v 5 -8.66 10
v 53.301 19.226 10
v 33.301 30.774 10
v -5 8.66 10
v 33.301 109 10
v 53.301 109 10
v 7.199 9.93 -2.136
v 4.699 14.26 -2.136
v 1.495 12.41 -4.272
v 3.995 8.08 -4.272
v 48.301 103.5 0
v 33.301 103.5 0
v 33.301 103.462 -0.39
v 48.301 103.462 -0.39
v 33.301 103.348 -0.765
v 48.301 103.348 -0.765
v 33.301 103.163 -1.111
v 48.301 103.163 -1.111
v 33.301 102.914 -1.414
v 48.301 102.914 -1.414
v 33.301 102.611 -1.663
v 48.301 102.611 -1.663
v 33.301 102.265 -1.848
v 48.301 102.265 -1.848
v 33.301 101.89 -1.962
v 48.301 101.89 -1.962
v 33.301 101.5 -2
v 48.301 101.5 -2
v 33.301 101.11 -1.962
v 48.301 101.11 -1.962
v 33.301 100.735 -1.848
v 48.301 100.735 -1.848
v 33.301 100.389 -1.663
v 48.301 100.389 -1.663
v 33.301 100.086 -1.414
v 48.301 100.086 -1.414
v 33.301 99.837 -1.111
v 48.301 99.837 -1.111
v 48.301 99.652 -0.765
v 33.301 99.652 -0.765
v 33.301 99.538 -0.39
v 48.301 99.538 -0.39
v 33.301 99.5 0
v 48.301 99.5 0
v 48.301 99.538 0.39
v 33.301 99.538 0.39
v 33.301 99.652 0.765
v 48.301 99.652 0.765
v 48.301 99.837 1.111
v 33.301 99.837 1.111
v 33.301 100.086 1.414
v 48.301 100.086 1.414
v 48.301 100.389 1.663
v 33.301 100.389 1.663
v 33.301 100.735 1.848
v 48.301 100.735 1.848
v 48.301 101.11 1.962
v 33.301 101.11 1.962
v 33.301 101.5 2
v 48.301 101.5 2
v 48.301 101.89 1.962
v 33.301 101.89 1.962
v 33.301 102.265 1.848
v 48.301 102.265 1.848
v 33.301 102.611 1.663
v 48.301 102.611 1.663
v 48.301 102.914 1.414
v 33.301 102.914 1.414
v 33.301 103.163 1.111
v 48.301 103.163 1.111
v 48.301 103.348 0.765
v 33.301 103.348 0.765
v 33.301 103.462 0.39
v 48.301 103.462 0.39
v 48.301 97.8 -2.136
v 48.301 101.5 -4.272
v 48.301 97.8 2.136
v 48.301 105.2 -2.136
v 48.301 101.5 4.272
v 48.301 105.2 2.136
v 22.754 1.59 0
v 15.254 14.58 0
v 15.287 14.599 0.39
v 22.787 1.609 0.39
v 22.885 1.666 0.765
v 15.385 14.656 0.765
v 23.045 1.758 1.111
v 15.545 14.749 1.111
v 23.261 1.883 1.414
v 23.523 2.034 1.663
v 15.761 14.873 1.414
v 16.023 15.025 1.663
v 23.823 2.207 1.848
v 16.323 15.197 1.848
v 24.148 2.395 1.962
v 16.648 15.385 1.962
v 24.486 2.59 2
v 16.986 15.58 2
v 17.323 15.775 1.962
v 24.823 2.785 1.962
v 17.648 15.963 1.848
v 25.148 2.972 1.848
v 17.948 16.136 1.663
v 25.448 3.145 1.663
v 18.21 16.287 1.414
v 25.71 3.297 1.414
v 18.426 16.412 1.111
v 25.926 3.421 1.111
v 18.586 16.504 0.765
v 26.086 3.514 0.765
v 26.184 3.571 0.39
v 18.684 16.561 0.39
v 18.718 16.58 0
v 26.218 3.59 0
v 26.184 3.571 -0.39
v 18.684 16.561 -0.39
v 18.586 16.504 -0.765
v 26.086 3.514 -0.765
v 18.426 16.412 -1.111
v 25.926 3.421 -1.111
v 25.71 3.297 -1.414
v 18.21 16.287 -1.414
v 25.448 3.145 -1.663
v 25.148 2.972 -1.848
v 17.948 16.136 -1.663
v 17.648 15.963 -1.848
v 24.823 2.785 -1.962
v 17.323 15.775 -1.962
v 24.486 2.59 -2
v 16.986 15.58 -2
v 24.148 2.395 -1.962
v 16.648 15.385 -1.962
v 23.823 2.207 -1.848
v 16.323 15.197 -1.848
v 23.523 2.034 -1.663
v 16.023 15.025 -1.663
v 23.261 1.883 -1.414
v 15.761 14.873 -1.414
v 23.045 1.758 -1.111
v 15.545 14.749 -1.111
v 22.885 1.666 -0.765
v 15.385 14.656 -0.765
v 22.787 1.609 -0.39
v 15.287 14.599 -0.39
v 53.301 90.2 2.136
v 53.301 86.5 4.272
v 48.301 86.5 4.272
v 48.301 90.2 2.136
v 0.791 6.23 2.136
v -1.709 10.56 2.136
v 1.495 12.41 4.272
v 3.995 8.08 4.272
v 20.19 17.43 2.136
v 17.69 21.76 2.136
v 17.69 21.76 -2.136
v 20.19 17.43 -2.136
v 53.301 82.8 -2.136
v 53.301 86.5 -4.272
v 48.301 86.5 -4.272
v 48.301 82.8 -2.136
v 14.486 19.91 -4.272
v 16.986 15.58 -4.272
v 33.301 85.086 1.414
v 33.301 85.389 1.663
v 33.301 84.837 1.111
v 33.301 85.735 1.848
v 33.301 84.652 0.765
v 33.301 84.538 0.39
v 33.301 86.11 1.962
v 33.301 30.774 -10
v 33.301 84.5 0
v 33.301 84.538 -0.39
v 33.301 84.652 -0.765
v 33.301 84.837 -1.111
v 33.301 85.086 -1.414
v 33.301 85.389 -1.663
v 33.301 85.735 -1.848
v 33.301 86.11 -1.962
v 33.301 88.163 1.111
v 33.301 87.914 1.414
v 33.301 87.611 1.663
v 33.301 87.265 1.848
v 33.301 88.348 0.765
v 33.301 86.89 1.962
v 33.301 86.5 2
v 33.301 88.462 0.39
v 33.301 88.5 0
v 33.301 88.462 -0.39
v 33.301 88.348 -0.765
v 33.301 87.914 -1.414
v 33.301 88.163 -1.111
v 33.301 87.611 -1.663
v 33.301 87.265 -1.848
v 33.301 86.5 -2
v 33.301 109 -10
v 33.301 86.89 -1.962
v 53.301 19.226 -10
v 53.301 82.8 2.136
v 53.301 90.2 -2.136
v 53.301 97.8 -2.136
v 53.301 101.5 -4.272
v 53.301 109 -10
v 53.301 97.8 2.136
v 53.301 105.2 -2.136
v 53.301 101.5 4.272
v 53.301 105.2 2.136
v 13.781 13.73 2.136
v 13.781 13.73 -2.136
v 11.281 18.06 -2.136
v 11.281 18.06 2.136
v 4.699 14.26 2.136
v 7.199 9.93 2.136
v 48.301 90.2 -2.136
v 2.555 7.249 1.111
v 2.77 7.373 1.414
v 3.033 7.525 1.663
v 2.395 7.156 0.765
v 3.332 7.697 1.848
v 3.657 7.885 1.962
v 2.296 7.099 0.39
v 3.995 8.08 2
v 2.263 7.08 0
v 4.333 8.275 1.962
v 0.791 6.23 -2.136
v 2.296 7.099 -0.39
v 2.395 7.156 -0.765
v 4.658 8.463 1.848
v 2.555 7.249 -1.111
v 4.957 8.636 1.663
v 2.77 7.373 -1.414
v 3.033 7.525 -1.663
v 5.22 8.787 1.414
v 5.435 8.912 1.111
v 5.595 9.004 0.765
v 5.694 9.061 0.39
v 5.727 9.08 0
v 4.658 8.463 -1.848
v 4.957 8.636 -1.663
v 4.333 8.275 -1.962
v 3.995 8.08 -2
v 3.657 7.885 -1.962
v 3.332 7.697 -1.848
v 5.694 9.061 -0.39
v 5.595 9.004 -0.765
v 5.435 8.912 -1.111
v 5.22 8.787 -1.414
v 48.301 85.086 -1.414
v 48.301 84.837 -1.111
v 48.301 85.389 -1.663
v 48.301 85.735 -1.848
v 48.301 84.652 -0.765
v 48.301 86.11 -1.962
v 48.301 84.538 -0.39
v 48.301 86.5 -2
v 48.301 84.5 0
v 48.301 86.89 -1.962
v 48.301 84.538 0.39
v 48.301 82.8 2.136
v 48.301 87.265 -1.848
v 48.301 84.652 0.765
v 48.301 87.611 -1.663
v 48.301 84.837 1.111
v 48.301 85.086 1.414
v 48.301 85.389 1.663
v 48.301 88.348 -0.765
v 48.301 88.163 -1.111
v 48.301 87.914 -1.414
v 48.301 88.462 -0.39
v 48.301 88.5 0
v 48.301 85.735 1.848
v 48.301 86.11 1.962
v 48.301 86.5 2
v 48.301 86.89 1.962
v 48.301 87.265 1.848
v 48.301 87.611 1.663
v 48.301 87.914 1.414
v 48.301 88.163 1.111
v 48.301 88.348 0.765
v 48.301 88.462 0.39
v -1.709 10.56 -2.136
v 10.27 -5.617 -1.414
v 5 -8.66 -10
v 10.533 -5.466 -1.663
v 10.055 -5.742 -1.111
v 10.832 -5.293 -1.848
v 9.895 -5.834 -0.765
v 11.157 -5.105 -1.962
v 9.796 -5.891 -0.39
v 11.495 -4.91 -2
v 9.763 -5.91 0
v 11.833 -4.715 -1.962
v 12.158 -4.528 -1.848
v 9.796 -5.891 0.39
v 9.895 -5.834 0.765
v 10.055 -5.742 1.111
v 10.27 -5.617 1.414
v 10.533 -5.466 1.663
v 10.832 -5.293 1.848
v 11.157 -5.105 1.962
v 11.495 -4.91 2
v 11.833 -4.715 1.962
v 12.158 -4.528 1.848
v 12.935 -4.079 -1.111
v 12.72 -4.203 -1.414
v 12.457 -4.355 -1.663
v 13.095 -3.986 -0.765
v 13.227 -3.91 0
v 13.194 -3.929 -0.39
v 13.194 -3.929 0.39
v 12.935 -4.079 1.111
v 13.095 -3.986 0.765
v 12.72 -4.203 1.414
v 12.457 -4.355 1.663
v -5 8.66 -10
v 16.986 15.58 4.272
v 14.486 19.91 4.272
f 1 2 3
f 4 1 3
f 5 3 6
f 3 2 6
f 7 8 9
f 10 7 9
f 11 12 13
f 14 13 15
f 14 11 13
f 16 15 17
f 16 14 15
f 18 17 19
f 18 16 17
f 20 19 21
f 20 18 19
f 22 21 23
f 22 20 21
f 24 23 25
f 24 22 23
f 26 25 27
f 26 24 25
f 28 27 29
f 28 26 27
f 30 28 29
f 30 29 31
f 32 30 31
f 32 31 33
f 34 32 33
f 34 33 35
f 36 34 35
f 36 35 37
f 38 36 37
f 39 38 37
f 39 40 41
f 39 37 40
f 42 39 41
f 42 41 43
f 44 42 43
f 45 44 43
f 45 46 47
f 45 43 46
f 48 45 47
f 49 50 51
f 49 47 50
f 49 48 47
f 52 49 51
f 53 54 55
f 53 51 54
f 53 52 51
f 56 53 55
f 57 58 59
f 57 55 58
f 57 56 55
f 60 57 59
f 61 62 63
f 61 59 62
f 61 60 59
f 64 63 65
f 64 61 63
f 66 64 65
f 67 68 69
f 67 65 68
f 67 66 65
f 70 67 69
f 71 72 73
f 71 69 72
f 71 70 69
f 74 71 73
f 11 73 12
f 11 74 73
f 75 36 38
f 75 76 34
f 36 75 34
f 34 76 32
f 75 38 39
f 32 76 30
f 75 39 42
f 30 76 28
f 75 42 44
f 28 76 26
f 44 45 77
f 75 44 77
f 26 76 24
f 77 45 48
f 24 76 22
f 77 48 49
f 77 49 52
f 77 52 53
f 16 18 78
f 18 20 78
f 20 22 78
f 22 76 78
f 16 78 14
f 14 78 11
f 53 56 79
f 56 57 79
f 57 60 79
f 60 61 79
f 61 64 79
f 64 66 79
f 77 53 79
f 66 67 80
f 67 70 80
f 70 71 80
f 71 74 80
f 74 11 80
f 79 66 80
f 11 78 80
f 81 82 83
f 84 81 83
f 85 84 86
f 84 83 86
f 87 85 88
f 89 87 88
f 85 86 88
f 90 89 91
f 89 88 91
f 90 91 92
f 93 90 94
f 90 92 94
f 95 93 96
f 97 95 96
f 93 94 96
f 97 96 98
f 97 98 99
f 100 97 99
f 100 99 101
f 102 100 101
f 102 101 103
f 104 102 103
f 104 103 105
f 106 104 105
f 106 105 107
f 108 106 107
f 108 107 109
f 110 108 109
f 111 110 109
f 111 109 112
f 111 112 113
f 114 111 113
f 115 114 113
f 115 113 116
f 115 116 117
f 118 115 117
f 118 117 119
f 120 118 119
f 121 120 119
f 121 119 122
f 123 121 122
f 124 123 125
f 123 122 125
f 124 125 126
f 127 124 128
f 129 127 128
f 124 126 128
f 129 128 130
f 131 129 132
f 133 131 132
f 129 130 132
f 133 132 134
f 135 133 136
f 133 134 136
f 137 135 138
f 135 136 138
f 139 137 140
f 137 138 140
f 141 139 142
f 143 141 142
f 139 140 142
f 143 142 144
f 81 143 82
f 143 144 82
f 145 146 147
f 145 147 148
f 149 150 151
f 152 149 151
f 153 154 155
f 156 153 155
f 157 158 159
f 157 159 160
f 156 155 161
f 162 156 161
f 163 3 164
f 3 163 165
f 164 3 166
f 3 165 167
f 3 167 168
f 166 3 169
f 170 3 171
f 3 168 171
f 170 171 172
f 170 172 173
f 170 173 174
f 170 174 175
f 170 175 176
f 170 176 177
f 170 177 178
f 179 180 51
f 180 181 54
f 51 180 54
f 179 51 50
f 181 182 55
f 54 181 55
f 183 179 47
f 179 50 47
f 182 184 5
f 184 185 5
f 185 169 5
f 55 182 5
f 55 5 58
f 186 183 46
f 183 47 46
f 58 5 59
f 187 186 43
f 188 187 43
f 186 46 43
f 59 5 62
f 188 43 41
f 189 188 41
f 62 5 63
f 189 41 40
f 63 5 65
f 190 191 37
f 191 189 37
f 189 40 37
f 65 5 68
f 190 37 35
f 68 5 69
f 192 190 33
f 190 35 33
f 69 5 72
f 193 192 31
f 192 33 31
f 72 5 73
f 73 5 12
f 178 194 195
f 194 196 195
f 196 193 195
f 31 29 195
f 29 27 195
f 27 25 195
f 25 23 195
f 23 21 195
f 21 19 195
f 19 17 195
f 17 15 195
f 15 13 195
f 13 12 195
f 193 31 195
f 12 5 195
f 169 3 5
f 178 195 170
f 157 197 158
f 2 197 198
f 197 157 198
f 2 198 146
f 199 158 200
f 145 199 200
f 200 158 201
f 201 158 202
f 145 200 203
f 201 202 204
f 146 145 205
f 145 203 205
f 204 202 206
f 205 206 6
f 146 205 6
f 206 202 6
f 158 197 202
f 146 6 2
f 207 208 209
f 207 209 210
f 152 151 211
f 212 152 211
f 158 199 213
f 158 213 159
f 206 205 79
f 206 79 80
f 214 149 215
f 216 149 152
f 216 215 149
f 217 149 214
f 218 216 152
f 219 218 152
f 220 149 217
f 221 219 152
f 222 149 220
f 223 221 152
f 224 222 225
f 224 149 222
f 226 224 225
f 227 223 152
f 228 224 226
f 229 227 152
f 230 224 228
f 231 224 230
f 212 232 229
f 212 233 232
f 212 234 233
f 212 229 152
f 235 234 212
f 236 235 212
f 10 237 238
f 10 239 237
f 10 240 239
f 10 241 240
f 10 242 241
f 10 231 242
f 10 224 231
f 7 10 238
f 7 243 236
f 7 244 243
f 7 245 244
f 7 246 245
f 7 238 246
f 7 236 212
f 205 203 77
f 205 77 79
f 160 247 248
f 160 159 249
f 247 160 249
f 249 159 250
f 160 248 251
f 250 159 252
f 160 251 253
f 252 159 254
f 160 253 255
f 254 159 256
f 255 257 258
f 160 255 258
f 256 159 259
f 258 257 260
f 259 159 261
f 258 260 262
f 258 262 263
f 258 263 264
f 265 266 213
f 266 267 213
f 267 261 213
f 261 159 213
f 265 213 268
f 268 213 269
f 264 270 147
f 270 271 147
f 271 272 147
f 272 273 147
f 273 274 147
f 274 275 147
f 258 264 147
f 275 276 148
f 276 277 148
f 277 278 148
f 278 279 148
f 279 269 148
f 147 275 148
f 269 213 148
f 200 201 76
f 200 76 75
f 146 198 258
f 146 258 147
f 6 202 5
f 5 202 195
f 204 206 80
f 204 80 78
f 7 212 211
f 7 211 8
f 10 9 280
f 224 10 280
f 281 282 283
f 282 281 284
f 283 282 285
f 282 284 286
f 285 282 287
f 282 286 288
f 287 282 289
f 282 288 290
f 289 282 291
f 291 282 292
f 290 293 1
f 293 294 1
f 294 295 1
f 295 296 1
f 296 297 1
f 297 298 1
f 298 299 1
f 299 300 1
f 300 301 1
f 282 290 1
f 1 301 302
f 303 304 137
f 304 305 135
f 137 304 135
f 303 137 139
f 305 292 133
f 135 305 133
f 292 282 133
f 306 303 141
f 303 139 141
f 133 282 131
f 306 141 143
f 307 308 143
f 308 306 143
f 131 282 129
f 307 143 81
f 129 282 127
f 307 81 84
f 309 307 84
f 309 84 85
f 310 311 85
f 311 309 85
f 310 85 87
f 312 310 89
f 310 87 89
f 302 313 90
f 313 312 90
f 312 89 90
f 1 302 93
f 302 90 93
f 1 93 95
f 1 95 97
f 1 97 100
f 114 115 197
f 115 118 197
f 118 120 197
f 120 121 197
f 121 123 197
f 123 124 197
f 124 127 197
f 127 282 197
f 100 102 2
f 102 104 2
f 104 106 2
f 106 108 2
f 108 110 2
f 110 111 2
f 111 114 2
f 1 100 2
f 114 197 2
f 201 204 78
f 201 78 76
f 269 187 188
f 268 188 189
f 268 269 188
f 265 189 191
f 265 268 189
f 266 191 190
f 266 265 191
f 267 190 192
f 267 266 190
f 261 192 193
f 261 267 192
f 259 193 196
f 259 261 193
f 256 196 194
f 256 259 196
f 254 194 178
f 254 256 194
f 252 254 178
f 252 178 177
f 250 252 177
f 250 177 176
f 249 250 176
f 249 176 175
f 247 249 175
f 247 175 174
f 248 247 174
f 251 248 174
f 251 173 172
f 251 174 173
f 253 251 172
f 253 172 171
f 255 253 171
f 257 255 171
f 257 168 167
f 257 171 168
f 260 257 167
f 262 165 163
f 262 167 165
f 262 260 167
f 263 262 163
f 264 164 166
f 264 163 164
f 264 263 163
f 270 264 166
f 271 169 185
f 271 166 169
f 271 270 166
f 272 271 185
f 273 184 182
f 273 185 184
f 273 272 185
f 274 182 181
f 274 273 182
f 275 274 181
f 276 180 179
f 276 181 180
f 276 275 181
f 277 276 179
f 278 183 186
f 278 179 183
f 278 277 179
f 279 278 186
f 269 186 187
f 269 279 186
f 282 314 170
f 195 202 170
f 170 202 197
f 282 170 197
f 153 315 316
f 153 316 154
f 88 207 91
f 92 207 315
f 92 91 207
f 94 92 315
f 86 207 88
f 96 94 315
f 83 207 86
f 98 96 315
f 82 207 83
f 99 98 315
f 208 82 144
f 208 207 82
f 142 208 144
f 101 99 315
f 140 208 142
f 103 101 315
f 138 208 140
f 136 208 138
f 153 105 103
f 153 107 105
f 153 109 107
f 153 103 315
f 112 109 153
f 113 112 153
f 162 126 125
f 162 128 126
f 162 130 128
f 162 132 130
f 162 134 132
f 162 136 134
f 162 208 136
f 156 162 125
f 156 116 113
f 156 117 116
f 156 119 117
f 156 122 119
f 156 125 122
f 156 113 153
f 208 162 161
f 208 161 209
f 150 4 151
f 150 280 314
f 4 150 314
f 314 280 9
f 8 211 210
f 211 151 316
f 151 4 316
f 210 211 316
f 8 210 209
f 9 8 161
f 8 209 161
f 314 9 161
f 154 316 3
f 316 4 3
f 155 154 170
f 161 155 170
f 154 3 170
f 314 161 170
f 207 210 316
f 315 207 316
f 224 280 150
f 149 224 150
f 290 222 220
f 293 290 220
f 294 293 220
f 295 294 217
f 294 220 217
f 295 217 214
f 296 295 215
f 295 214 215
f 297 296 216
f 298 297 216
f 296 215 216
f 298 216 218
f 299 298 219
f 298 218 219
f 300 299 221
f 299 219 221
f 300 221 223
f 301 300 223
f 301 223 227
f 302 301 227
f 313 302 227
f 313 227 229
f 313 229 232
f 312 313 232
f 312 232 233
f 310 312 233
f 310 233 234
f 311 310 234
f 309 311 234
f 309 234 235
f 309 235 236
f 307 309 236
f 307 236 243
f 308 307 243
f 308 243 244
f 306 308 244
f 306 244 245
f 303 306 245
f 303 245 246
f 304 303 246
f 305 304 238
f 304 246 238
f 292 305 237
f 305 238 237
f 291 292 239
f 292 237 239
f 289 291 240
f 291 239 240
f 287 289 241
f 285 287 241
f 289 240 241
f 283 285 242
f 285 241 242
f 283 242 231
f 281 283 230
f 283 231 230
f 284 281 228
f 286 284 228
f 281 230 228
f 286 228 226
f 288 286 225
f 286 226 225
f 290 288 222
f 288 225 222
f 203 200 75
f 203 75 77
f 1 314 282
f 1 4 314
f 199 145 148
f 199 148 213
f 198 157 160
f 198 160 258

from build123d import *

# Parameters (mm, degrees)
SKETCH4_W          = 20
SKETCH4_H          = 20
CUT_EXTRUDE1_REACH = 118.478
SKETCH5_R          = 2
SKETCH5_3_R        = 2
CUT_EXTRUDE2_DEPTH = 5
SKETCH6_R          = 2
CUT_EXTRUDE3_DEPTH = 139.877964102
SKETCH6_5_R        = 2
CUT_EXTRUDE4_DEPTH = 5


with BuildPart() as part:
    # Sweep1: sweep along a path in Sketch1
    with BuildLine(Plane.XY) as sweep1_path:
        Line((0, 0), (43.301270189, 25))
        Line((43.301270189, 25), (43.301270189, 109))
    # Sketch4 → Sweep1 (sweep)
    with BuildSketch(Plane(origin=(0, 0, 0), x_dir=(0, 0, 1), z_dir=(-0.866025403784438, -0.5000000000000012, 0))):
        Rectangle(SKETCH4_W, SKETCH4_H)
    sweep(path=sweep1_path.line, transition=Transition.RIGHT)

    # Sketch5 → Cut-Extrude1 (cut, up to next)
    with BuildSketch(Plane(origin=(-5, 8.660254038, 0), x_dir=(0.866025403784438, 0.5000000000000012, 0), z_dir=(-0.5000000000000012, 0.866025403784438, 0)), mode=Mode.PRIVATE) as cut_extrude1_sk1:
        with Locations(Location((7.5, 0, 0), (0, 0, 180))):
            Circle(SKETCH5_R)
    cut_extrude1_tool1 = extrude(cut_extrude1_sk1.sketch, amount=-CUT_EXTRUDE1_REACH, mode=Mode.PRIVATE) & part.part
    # Sketch5 → Cut-Extrude1 (cut, up to next)
    with BuildSketch(Plane(origin=(-5, 8.660254038, 0), x_dir=(0.866025403784438, 0.5000000000000012, 0), z_dir=(-0.5000000000000012, 0.866025403784438, 0)), mode=Mode.PRIVATE) as cut_extrude1_sk2:
        with Locations(Location((22.5, 0, 0), (0, 0, 180))):
            Circle(SKETCH5_R)
    cut_extrude1_tool2 = extrude(cut_extrude1_sk2.sketch, amount=-CUT_EXTRUDE1_REACH, mode=Mode.PRIVATE) & part.part
    add(cut_extrude1_tool1.solids().sort_by_distance((1.495191, 12.410254, 0))[0], mode=Mode.SUBTRACT)
    add(cut_extrude1_tool2.solids().sort_by_distance((14.485572, 19.910254, 0))[0], mode=Mode.SUBTRACT)

    # Sketch5<3> → Cut-Extrude2 (cut)
    # profile 1 of 2: a face of its own
    with BuildSketch(Plane(origin=(-5, 8.660254038, 0), x_dir=(0.866025403784438, 0.5000000000000012, 0), z_dir=(-0.5000000000000012, 0.866025403784438, 0))):
        Polygon((11.2, -2.136195996), (11.2, 2.136195996), (7.5, 4.272391992), (3.8, 2.136195996), (3.8, -2.136195996), (7.5, -4.272391992), align=None)
        with Locations(Location((7.5, 0, 0), (0, 0, 180))):
            Circle(SKETCH5_3_R, mode=Mode.SUBTRACT)
    # profile 2 of 2: a face of its own
    with BuildSketch(Plane(origin=(-5, 8.660254038, 0), x_dir=(0.866025403784438, 0.5000000000000012, 0), z_dir=(-0.5000000000000012, 0.866025403784438, 0))):
        Polygon((26.2, -2.136195996), (26.2, 2.136195996), (22.5, 4.272391992), (18.8, 2.136195996), (18.8, -2.136195996), (22.5, -4.272391992), align=None)
        with Locations(Location((22.5, 0, 0), (0, 0, 180))):
            Circle(SKETCH5_3_R, mode=Mode.SUBTRACT)
    extrude(amount=-CUT_EXTRUDE2_DEPTH, mode=Mode.SUBTRACT)

    # Sketch6 → Cut-Extrude3 (cut, through all)
    with BuildSketch(Plane(origin=(53.301270189, 0, -53.301270189), x_dir=(0, 0, 1), z_dir=(-1, 0, 0))):
        with Locations(Location((53.301270189, 101.5, 0), (0, 0, 90))):
            Circle(SKETCH6_R)
        with Locations(Location((53.301270189, 86.5, 0), (0, 0, 90))):
            Circle(SKETCH6_R)
    extrude(amount=CUT_EXTRUDE3_DEPTH, mode=Mode.SUBTRACT)

    # Sketch6<5> → Cut-Extrude4 (cut)
    # profile 1 of 2: a face of its own
    with BuildSketch(Plane(origin=(53.301270189, 0, -53.301270189), x_dir=(0, 0, 1), z_dir=(-1, 0, 0))):
        Polygon((55.437466185, 97.8), (57.573662181, 101.5), (55.437466185, 105.2), (51.165074193, 105.2), (49.028878197, 101.5), (51.165074193, 97.8), align=None)
        with Locations(Location((53.301270189, 101.5, 0), (0, 0, 90))):
            Circle(SKETCH6_5_R, mode=Mode.SUBTRACT)
    # profile 2 of 2: a face of its own
    with BuildSketch(Plane(origin=(53.301270189, 0, -53.301270189), x_dir=(0, 0, 1), z_dir=(-1, 0, 0))):
        Polygon((55.437466185, 82.8), (57.573662181, 86.5), (55.437466185, 90.2), (51.165074193, 90.2), (49.028878197, 86.5), (51.165074193, 82.8), align=None)
        with Locations(Location((53.301270189, 86.5, 0), (0, 0, 90))):
            Circle(SKETCH6_5_R, mode=Mode.SUBTRACT)
    extrude(amount=CUT_EXTRUDE4_DEPTH, mode=Mode.SUBTRACT)


solid = part.part
